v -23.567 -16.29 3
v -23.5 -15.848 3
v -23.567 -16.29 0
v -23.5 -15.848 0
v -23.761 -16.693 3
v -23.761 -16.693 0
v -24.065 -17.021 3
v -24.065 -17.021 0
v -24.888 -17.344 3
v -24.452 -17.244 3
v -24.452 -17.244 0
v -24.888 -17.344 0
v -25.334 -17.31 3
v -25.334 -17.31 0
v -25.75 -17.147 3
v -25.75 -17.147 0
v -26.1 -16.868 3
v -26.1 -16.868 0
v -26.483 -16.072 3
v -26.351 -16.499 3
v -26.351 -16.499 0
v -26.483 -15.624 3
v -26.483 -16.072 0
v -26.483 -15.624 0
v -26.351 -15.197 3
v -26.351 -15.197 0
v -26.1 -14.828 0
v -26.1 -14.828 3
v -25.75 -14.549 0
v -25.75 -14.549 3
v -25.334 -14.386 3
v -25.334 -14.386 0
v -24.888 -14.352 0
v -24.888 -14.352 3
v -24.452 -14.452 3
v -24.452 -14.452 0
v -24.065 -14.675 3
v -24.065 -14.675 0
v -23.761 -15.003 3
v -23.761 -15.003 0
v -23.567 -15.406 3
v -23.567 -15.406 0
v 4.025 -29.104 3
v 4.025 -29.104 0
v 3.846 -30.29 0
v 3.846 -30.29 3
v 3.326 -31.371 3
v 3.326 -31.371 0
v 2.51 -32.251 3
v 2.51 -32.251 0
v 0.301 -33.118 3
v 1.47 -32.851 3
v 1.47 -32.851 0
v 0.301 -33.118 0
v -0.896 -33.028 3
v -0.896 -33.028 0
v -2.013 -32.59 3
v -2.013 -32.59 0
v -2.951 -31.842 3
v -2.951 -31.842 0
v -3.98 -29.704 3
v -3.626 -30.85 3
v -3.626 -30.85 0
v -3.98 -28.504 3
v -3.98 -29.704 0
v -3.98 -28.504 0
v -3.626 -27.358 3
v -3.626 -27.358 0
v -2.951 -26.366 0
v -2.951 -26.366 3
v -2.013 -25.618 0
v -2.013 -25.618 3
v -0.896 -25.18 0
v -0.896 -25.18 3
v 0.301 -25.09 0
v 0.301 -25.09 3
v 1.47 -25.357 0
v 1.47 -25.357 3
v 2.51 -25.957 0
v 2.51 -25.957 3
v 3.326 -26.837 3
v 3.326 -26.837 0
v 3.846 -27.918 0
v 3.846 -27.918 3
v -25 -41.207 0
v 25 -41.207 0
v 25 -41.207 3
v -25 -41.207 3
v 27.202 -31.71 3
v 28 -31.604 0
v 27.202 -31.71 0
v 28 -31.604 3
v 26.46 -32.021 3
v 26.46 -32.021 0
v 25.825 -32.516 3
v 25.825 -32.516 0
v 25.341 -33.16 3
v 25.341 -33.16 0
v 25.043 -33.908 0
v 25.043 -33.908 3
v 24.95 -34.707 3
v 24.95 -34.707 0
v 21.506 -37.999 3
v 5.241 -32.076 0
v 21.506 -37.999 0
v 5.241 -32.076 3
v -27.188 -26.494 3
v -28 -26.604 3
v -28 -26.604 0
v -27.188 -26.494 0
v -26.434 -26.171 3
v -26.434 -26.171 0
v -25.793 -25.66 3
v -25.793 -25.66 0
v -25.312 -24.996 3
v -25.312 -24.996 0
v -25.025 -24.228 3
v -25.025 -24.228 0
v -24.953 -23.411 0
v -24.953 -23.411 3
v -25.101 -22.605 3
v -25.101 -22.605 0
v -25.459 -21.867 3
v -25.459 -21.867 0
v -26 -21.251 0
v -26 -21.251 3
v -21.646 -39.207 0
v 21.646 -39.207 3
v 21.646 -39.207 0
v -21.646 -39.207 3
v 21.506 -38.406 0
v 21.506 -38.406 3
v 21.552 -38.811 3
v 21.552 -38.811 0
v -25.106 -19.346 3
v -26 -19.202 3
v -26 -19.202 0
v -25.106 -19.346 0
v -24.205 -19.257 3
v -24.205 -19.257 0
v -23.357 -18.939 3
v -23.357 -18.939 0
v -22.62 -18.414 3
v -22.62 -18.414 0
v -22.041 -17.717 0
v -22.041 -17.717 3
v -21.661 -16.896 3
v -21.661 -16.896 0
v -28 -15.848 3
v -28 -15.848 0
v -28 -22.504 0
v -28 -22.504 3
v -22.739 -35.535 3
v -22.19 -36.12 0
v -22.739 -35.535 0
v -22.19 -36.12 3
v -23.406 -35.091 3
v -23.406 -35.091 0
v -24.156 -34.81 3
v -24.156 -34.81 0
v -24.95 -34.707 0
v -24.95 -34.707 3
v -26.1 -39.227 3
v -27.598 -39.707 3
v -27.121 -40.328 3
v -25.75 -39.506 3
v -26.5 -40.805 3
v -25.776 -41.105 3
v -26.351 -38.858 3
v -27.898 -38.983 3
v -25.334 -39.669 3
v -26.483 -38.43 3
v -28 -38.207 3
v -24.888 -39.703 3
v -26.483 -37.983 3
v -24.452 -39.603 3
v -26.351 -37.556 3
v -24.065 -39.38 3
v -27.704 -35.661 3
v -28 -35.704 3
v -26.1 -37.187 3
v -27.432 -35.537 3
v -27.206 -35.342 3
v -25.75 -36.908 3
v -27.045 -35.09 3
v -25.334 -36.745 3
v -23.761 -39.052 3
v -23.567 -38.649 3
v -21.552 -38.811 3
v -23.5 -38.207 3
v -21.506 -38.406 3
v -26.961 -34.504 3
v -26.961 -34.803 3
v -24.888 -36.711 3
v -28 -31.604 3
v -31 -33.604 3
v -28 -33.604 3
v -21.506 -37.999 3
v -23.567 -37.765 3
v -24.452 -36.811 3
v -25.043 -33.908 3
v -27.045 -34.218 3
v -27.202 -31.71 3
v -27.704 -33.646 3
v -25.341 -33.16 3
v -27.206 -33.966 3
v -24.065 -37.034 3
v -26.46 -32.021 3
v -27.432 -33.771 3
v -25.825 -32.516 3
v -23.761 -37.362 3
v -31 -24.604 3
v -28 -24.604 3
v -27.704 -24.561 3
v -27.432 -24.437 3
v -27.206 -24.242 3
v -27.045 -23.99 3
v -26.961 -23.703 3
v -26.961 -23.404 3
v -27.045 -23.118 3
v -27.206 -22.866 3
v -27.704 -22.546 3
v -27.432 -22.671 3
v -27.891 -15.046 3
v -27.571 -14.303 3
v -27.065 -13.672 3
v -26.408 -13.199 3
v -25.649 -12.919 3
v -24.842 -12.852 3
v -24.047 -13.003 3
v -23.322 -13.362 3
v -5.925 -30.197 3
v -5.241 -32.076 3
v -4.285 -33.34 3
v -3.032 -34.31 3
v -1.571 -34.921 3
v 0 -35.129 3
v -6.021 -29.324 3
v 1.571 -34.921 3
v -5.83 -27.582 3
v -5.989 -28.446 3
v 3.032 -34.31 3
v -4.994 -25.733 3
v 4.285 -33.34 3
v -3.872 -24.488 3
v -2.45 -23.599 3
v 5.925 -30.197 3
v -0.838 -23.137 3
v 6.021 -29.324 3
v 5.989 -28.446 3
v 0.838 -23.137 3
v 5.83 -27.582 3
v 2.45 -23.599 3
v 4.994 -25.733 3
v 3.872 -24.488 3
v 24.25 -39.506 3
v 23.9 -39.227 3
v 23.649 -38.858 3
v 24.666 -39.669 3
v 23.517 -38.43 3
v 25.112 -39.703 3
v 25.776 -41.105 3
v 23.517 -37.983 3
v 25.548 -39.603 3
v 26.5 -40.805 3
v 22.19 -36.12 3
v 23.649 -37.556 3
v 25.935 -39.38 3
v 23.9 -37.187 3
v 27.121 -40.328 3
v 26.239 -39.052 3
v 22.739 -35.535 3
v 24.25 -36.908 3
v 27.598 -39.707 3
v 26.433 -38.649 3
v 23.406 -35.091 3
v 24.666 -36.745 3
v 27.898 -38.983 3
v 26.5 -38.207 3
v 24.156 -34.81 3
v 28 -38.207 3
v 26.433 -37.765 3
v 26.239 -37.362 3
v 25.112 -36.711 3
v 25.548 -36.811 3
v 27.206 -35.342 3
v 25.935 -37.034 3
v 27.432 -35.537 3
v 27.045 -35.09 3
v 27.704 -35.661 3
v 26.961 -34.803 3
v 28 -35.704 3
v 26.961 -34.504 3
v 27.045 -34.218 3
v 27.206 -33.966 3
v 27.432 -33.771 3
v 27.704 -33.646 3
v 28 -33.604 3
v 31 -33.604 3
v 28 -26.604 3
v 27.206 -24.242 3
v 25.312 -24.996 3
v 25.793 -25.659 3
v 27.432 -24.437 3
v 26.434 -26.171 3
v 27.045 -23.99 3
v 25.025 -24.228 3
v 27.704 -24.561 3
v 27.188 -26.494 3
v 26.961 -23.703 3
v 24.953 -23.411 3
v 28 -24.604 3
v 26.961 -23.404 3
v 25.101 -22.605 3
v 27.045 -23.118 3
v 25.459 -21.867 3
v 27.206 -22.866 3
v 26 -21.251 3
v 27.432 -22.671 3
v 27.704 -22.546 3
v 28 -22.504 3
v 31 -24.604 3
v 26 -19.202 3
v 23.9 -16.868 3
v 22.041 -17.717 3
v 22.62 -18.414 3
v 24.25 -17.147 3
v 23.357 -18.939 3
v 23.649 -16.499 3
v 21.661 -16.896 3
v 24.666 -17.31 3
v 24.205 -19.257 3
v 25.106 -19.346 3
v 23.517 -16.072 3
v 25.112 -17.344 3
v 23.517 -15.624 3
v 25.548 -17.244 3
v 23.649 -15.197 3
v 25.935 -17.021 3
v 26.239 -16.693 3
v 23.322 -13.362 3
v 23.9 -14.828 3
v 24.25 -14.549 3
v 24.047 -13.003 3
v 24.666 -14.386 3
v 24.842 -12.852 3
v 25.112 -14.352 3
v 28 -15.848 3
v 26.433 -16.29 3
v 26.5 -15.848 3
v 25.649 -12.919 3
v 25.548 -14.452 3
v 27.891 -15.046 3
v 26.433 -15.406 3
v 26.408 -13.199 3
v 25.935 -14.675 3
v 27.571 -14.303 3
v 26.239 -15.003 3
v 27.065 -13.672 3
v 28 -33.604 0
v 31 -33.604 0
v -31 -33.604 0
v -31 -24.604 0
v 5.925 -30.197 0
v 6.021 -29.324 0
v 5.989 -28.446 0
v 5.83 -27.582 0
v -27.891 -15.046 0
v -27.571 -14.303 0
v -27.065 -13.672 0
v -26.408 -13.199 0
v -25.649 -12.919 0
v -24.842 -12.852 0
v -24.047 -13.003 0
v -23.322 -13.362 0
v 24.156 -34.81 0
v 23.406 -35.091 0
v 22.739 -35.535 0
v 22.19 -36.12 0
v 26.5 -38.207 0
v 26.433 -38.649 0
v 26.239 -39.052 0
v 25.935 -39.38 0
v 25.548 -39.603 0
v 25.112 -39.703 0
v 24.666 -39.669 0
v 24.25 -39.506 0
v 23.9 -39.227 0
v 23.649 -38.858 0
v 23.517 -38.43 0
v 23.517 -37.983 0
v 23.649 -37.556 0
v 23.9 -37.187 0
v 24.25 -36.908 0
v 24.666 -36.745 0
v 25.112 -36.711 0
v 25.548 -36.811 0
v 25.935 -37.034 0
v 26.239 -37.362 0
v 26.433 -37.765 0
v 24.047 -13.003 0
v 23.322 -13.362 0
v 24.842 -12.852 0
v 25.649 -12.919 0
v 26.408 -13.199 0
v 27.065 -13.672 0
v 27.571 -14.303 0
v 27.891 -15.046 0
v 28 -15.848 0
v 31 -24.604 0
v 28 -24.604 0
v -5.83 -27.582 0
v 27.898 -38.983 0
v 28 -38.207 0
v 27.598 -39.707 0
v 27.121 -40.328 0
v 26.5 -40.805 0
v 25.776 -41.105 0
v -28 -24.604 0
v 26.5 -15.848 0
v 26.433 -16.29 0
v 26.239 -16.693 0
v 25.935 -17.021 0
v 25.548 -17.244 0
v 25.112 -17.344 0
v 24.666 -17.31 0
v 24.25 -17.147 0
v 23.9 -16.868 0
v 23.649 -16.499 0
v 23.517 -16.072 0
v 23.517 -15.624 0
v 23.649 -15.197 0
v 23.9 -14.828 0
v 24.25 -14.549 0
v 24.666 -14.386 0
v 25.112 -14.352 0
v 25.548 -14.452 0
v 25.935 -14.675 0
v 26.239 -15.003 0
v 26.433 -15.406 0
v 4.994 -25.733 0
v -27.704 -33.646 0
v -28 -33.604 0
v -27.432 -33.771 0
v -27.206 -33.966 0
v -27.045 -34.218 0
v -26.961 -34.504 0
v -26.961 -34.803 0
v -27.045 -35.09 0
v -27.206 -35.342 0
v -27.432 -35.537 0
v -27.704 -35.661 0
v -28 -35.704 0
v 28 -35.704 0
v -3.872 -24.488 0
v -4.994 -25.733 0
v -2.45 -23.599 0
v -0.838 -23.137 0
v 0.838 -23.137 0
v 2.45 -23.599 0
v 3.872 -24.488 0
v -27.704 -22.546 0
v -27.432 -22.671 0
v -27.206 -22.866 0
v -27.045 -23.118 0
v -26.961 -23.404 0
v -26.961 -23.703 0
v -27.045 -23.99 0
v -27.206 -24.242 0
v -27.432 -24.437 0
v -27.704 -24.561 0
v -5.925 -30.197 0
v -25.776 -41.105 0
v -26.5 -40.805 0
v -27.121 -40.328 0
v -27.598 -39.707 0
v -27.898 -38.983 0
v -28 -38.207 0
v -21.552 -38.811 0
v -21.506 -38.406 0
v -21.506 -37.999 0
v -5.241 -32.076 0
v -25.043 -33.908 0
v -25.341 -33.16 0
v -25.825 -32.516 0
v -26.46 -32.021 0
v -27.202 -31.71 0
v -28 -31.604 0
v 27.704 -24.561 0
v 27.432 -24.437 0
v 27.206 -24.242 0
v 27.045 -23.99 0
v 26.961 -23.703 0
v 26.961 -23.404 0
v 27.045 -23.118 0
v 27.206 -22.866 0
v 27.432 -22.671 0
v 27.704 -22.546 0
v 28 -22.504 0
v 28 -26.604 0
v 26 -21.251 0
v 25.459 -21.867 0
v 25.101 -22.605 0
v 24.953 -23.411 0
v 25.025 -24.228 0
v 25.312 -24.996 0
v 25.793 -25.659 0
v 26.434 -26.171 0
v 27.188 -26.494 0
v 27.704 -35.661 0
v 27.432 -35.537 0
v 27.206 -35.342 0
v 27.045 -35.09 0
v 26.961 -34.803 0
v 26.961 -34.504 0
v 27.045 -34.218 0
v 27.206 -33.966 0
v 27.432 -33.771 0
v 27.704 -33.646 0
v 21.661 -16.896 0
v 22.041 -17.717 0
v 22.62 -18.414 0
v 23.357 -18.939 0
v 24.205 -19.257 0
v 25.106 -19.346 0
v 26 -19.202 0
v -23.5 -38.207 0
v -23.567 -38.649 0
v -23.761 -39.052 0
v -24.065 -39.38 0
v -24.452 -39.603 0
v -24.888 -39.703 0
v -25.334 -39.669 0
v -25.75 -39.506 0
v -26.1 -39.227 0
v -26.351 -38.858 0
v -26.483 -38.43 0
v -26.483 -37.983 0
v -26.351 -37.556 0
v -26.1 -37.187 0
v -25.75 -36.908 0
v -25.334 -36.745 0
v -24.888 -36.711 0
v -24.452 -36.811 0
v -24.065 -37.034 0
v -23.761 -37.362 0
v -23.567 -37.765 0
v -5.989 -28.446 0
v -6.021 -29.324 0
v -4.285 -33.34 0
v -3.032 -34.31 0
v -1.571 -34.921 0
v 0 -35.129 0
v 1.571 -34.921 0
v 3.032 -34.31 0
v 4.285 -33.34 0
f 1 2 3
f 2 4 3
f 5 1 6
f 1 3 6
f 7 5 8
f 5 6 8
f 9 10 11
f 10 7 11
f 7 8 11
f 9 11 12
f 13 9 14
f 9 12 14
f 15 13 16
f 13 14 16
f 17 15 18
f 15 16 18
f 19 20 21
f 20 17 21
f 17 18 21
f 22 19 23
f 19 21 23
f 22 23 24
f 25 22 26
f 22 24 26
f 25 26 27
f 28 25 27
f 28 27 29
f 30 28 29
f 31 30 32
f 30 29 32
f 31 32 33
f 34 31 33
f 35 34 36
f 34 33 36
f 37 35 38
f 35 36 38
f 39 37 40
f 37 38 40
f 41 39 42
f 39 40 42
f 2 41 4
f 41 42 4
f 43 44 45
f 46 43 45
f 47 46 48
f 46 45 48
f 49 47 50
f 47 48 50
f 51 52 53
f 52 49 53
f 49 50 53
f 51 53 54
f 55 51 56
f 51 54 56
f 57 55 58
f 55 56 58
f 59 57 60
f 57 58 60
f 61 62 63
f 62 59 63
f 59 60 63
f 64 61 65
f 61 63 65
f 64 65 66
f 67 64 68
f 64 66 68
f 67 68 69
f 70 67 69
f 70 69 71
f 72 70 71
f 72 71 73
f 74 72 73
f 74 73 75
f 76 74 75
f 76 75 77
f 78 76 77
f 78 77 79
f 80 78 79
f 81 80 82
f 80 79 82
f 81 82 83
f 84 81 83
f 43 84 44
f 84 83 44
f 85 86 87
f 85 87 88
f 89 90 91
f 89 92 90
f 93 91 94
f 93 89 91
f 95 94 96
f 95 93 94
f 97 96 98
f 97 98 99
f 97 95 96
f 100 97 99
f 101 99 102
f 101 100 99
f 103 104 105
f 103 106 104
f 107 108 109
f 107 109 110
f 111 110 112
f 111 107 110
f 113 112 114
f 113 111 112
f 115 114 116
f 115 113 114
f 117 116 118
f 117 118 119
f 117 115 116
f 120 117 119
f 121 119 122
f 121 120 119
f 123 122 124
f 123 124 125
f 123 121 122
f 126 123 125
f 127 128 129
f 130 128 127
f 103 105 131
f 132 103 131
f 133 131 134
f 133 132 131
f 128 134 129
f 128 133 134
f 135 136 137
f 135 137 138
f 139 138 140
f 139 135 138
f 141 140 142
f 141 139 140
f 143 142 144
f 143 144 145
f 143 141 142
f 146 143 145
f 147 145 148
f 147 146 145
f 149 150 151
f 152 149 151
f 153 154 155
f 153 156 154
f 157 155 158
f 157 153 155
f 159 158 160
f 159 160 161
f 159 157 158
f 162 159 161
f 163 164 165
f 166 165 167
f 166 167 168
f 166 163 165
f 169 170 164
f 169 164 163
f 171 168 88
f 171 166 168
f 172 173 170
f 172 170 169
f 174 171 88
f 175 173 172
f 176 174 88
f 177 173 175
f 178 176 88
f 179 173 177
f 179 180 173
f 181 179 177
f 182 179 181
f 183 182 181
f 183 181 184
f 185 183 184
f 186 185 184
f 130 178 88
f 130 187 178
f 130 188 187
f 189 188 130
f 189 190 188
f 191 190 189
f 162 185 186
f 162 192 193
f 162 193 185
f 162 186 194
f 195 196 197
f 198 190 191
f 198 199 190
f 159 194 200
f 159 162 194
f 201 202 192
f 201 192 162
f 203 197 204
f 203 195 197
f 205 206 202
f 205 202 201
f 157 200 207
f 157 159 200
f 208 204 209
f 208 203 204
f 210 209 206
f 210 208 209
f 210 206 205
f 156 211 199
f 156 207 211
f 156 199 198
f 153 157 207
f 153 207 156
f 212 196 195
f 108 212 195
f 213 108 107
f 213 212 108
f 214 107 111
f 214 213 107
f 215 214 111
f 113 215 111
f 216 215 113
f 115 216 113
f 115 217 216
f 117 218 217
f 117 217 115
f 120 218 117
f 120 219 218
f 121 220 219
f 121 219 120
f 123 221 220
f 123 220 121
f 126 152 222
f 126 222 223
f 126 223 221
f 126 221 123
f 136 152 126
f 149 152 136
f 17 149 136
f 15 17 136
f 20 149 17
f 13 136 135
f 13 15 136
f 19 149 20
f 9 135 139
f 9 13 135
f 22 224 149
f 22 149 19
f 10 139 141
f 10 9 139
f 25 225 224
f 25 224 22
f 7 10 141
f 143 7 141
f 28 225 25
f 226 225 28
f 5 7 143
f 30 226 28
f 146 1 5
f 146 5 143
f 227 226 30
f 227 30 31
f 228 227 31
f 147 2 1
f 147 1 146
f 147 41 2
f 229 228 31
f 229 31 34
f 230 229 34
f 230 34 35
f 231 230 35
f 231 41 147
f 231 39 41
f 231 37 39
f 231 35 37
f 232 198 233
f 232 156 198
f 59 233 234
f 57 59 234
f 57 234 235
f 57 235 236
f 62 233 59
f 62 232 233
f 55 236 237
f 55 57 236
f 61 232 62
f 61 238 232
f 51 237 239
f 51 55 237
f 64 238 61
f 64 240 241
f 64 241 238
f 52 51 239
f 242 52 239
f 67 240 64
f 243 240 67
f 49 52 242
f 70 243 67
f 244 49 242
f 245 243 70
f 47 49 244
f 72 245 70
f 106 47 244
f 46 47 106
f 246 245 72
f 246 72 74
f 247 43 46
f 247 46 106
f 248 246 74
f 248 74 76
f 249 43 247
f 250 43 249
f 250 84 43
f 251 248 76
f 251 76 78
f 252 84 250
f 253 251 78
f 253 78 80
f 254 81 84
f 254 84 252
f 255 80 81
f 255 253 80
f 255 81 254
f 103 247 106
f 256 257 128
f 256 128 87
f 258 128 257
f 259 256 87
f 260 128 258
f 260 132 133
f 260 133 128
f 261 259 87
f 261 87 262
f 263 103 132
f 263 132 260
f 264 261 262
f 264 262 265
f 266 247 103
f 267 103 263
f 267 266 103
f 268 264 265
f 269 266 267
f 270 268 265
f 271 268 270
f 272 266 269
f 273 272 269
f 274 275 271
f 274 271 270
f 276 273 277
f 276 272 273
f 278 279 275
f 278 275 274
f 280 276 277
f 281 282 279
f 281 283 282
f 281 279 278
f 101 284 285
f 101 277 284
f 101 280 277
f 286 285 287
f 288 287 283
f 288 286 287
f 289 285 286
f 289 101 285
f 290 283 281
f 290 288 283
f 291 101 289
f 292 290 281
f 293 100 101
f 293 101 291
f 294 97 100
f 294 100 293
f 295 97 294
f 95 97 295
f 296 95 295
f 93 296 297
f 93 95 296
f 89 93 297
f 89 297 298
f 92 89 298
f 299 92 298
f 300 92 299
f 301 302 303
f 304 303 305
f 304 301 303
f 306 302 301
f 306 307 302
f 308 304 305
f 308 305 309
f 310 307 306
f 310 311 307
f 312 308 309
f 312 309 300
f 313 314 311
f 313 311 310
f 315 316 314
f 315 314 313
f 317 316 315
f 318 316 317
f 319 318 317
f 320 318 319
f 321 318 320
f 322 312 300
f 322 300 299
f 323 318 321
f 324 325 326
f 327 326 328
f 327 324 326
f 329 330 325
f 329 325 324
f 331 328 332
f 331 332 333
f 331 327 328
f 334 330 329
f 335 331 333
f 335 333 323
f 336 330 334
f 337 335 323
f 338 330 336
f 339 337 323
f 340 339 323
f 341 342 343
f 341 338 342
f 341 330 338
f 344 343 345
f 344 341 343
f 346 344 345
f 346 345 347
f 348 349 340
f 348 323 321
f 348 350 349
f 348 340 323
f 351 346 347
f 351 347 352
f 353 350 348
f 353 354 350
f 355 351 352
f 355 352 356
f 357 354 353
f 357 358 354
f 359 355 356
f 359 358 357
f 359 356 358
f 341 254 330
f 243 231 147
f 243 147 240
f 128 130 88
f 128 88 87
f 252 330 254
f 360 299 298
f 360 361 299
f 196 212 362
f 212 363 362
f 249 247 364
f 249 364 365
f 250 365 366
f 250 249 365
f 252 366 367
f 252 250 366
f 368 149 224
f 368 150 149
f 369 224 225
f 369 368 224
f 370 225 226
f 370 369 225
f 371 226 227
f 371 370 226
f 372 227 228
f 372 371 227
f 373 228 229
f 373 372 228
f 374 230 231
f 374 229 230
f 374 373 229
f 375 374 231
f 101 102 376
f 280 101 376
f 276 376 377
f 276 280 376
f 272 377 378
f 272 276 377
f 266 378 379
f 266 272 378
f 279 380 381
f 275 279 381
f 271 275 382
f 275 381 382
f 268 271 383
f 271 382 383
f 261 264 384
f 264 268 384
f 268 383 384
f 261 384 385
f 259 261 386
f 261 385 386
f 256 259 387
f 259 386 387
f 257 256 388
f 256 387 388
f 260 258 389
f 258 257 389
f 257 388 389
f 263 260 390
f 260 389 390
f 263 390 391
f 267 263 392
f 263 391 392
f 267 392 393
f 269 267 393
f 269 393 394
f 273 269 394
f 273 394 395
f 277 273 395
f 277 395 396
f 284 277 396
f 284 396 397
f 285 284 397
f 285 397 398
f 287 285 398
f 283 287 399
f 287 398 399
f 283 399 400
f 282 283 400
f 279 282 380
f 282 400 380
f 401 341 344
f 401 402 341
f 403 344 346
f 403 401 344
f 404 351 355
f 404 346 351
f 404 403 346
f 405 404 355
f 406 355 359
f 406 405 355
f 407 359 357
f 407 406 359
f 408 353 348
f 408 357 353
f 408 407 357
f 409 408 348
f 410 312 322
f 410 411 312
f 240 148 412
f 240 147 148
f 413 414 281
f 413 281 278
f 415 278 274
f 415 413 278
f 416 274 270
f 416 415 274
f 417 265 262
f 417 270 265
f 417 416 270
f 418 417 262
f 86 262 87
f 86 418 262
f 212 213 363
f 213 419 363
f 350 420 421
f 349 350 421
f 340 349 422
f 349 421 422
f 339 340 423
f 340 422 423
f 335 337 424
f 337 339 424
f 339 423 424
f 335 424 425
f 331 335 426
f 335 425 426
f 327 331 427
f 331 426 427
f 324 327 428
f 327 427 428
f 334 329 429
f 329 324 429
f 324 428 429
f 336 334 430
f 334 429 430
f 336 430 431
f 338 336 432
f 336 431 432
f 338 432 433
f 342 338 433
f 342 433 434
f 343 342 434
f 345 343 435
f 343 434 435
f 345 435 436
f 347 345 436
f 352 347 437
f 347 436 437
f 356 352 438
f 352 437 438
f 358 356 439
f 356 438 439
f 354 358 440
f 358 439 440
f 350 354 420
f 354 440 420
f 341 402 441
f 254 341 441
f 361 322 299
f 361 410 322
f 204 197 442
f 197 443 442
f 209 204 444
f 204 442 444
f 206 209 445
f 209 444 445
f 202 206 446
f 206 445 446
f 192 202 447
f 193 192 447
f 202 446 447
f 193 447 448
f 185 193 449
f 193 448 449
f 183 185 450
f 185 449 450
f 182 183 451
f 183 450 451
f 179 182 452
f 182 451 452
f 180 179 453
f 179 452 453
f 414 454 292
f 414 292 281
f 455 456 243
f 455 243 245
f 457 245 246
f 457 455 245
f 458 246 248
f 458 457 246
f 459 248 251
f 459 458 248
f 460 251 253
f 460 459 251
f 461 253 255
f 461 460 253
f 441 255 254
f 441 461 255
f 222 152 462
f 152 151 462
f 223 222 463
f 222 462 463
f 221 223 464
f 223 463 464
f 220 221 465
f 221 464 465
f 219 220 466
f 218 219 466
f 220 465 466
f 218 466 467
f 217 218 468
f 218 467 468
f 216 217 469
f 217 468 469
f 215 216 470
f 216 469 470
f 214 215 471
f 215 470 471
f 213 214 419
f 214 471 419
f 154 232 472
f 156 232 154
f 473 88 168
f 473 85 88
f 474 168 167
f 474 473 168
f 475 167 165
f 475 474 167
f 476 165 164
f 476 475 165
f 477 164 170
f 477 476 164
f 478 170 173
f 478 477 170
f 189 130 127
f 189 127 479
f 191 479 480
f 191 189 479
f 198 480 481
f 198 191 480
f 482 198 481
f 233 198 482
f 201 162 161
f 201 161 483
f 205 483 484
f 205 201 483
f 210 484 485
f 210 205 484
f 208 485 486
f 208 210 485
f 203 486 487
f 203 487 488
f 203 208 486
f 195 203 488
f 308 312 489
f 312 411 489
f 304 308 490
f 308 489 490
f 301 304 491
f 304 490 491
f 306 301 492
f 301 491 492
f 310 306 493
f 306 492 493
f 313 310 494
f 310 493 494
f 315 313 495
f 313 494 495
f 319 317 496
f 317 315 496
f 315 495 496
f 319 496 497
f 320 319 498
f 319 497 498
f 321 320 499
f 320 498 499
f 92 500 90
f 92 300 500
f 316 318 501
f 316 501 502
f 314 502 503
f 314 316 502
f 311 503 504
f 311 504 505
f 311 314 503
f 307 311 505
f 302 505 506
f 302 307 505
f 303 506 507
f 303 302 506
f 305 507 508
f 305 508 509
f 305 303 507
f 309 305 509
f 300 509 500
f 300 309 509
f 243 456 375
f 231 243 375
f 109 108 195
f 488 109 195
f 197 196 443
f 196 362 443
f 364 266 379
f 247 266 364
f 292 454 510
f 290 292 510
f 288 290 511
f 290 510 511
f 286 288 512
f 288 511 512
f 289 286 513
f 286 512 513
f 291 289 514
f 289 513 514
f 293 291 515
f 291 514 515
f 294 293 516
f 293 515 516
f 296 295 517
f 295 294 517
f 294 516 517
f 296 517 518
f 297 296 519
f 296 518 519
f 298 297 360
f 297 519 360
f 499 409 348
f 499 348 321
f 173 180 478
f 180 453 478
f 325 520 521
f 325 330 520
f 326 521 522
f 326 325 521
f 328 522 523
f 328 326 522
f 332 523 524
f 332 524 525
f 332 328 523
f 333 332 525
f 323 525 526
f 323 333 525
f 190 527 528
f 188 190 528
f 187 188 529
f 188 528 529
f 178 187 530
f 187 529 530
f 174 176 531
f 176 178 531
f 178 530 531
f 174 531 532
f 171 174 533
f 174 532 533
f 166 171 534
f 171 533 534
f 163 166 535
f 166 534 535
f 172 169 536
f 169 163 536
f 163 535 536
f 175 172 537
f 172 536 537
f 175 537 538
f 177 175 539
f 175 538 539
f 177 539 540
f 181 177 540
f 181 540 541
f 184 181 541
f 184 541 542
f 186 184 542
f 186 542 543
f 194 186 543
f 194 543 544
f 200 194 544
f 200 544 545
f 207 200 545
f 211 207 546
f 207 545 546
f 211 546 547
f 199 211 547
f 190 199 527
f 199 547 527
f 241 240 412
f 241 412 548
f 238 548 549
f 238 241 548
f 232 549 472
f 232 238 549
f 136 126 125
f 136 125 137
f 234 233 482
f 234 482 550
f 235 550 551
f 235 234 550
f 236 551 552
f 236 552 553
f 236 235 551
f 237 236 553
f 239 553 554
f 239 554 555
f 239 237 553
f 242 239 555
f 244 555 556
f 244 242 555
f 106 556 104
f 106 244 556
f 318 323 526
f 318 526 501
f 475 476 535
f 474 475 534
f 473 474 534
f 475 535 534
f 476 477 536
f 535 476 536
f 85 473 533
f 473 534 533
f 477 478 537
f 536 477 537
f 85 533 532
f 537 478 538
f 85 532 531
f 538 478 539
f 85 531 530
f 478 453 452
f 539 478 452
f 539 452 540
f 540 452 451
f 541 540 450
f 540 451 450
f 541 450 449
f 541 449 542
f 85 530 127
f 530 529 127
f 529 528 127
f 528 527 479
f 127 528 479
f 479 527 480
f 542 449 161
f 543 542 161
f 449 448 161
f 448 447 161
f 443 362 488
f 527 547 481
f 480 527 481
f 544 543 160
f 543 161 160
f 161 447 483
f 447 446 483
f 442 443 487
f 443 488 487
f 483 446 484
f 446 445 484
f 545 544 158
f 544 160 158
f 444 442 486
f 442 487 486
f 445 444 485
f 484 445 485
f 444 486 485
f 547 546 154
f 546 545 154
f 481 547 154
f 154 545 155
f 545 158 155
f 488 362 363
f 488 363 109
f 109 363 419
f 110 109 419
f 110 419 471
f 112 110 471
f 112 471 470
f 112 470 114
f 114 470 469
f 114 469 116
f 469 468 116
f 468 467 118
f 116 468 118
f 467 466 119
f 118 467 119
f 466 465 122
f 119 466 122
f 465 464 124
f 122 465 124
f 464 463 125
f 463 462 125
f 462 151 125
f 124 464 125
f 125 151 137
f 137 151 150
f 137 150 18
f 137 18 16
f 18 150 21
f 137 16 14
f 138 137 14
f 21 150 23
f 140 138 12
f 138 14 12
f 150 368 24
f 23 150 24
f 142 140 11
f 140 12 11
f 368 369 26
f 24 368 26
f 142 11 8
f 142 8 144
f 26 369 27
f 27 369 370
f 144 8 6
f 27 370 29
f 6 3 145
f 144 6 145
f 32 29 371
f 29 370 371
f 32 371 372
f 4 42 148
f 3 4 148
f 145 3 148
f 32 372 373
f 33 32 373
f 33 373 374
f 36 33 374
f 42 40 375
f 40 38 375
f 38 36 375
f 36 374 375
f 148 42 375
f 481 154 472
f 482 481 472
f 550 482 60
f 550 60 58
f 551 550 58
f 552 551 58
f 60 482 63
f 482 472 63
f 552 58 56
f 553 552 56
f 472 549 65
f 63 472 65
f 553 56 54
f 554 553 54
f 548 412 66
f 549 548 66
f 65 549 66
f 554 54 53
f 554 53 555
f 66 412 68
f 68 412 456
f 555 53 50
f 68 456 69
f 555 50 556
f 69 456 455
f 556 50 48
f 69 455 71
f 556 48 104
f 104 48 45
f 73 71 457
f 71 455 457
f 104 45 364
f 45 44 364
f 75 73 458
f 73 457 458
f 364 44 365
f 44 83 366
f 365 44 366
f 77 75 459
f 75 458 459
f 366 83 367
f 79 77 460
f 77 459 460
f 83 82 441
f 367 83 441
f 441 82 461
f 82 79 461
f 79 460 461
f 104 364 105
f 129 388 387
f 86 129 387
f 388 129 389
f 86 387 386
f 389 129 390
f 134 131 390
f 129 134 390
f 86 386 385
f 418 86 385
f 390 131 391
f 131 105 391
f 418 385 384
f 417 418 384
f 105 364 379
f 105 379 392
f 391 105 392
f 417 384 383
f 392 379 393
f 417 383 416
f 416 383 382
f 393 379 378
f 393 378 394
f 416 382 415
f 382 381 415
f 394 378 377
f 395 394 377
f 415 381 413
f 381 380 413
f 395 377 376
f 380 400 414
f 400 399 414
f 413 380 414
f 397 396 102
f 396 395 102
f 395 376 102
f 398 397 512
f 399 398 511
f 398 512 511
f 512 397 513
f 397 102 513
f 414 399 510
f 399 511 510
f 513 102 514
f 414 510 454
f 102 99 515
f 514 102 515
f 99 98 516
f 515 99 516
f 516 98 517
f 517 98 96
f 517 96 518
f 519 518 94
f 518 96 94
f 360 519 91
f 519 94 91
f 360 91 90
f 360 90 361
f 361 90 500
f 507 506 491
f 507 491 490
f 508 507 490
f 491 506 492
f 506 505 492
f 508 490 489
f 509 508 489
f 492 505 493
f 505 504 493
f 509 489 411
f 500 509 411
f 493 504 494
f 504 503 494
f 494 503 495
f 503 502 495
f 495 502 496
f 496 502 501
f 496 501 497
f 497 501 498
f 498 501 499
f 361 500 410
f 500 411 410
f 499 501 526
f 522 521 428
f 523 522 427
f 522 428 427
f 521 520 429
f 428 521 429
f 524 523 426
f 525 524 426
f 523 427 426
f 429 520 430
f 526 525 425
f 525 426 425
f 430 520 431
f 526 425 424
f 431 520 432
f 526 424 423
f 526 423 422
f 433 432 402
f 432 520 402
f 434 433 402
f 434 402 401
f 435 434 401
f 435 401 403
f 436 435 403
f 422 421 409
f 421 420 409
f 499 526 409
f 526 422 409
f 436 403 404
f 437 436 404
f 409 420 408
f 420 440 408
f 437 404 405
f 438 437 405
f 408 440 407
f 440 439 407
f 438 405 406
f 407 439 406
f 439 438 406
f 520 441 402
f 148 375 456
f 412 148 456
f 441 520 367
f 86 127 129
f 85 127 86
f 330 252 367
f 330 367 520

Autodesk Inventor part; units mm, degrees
ref_plane "YZ Plane" through (0, 0, 0) normal (1, 0, 0) x (0, 1, 0)
ref_plane "XZ Plane" through (0, 0, 0) normal (0, 1, 0) x (-1, 0, 0)
ref_plane "XY Plane" through (0, 0, 0) normal (0, 0, 1) x (1, 0, 0)
sketch "スケッチ1" plane through (0, 0, 0) normal (0, 0, 1) x (1, 0, 0)
  line L0 (0, 0) -> (0, 4) construction
  line L1 (0, 0) -> (8.6476, -12.2564)
  line L2 (8.6476, -12.2564) -> (-0.2755, 4.5179)
  circle A0 centre (3.0119, -1.6621) radius 4
  line L3 (-57.3278, -140) -> (69.8706, -140)
  line L4 (3.0119, -1.6621) -> (117.7837, 59.3906)
  circle A1 centre (0, 0) radius 23.1
  circle A2 centre (0, -29.1039) radius 6.0039
  line L5 (0, 0) -> (0, -29.1039) construction
  circle A3 centre (0, -29.1039) radius 16.55
  circle A4 centre (0, -7.5039) radius 5.05
  circle A5 centre (0, 4) radius 3
  circle A6 centre (0, -7.5039) radius 20.05
  circle A7 centre (-14, 10.2376) radius 2.55
  circle A8 centre (14, 10.2376) radius 2.55
  circle A9 centre (14, -25.2454) radius 2.55
  circle A10 centre (-14, -25.2454) radius 2.55
  circle A11 centre (-14, 10.2376) radius 14
  circle A12 centre (14, 10.2376) radius 14
  circle A13 centre (14, -25.2454) radius 14
  circle A14 centre (-14, -25.2454) radius 14
  line L6 (-14, 10.2376) -> (-14, -25.2454) construction
  line L7 (-14, -25.2454) -> (14, -25.2454) construction
  circle A15 centre (0, 0) radius 9
  line L8 (-0.2755, 4.5179) -> (3.4816, -2.5449) construction
  line L9 (-2.9462, 3.0973) -> (0.8109, -3.9656)
  line L10 (6.1522, -1.1243) -> (2.3951, 5.9386)
  arc A16 (2.3951, 5.9386) -> (-2.9462, 3.0973) centre (-0.2755, 4.5179) ccw
  arc A17 (0.8109, -3.9656) -> (6.1522, -1.1243) centre (3.4816, -2.5449) ccw
  line L11 (-5, 2.8868) -> (5, 2.8868) construction
  line L12 (5, 2.8868) -> (0, -5.7735) construction
  line L13 (0, -5.7735) -> (-5, 2.8868) construction
  circle A18 centre (-5, 2.8868) radius 1.5
  circle A19 centre (5, 2.8868) radius 1.5
  circle A20 centre (0, -5.7735) radius 1.5
  line L14 (-28, 22.5965) -> (-28, -43.3295)
  line L15 (28, 22.9271) -> (28, -43.0008)
  line L16 (-28, 26.1991) -> (28, 26.1991)
  circle A21 centre (0, 0) radius 25.1
  line L17 (-28, -18.848) -> (28, -18.848)
  circle A22 centre (0, -29.1039) radius 8.0039
  circle A23 centre (-25, 23.1991) radius 3
  circle A24 centre (25, 23.1991) radius 3
  circle A25 centre (25, -38.2069) radius 3
  circle A26 centre (-25, -38.2069) radius 3
  circle A27 centre (-25, -15.848) radius 3
  circle A28 centre (25, -15.848) radius 3
  circle A29 centre (-25, -15.848) radius 4.5
  circle A30 centre (25, -15.848) radius 4.5
  circle A31 centre (0, -7.5039) radius 4.5
  circle A32 centre (0, -29.1039) radius 17.55
  circle A33 centre (0, -7.5039) radius 6.05
  point P0 (1.603, 0.9865)
  dimension "d0" = 4
  dimension "d1" = 15
  dimension "d2" = 18.4133
  dimension "d3" = 19
  dimension "d4" = 8
  dimension "d5" = 12
  dimension "d6" = 140
  dimension "d7" = 130
  dimension "d8" = 46.2
  dimension "d9" = 29.1039
  dimension "d10" = 33.1
  dimension "d11" = 10.1
  dimension "d12" = 6
  dimension "d13" = 40.1
  dimension "d14" = 28
  dimension "d15" = 28
  dimension "d16" = 28
  dimension "d17" = 28
  dimension "d18" = 18
  dimension "d19" = 8
  dimension "d20" = 6.05
  dimension "d21" = 3
  dimension "d22" = 3
  dimension "d23" = 3
  dimension "d24" = 10
  dimension "d25" = 2
  dimension "d26" = 2
  dimension "d27" = 6
  dimension "d28" = 6
  dimension "d29" = 6
  dimension "d30" = 6
  dimension "d31" = 6
  dimension "d32" = 6
  dimension "d33" = 9
  dimension "d34" = 9
  dimension "d35" = 9
  dimension "d36" = 5.1
  dimension "d37" = 1
  dimension "d38" = 1
  dimension "d39" = 56
  dimension "d40" = 28
sketch "スケッチ2" plane through (0, 0, 0) normal (0, 0, 1) x (1, 0, 0)
  circle A0 centre (-25, -15.848) radius 3 projected
  circle A1 centre (-25, -38.2069) radius 3 projected
  circle A2 centre (25, -38.2069) radius 3 projected
  circle A3 centre (25, -15.848) radius 3 projected
  circle A4 centre (0, -29.1039) radius 6.0039 construction
  circle A5 centre (0, 0) radius 25.1 construction
  circle A6 centre (0, -29.1039) radius 4.025
  line L0 (25, -41.2069) -> (-25, -41.2069)
  circle A7 centre (-25, -15.848) radius 1.5
  circle A8 centre (25, -15.848) radius 1.5
  circle A9 centre (25, -38.2069) radius 1.5
  circle A10 centre (-25, -38.2069) radius 1.5
  circle A11 centre (0, -29.1039) radius 6.025
  line L1 (23.3216, -13.3615) -> (4.9938, -25.733)
  line L2 (-4.9938, -25.733) -> (-23.3216, -13.3615)
  line L3 (-28, -15.848) -> (-28, -38.2069)
  line L4 (28, -15.848) -> (28, -38.2069)
  line L5 (-28, -24.6039) -> (-31, -24.6039)
  line L6 (-31, -24.6039) -> (-31, -33.6039)
  line L7 (-31, -33.6039) -> (-28, -33.6039)
  line L8 (28, -24.6039) -> (31, -24.6039)
  line L9 (31, -24.6039) -> (31, -33.6039)
  line L10 (31, -33.6039) -> (28, -33.6039)
  circle A12 centre (-28, -34.6539) radius 1.05
  circle A13 centre (-28, -23.5539) radius 1.05
  circle A14 centre (28, -23.5539) radius 1.05
  circle A15 centre (28, -34.6539) radius 1.05
  point P0 (-28, -22.5039)
  point P1 (-28, -35.7039)
  point P2 (28, -35.7039)
  point P3 (28, -22.5039)
  dimension "d41" = 8.05
  dimension "d52" = 3
  dimension "d53" = 3
  dimension "d54" = 3
  dimension "d55" = 3
  dimension "d57" = 2
  dimension "d61" = 3
  dimension "d62" = 9
  dimension "d63" = 3
  dimension "d64" = 9
  dimension "d65" = 2.1
  dimension "d66" = 2.1
  dimension "d67" = 2.1
  dimension "d68" = 2.1
  dimension "d69" = 4.5
extrude "押し出し2" add sketch "スケッチ2" along normal blind 3 contours A0 | A0 L2 A11 L1 A3 L4 A14 A15 A2 L0 A1 L3 A12 A13 | A11 | L3 L7 L6 L5 | A3 | A1 | L8 L9 L10 L4 | A2
sketch "スケッチ3" plane through (0, 0, 3) normal (0, 0, 1) x (1, 0, 0)
  line L0 (-28, -15.848) -> (-28, -22.5039) projected
  arc A0 (-28, -24.6039) -> (-28, -22.5039) centre (-28, -23.5539) ccw projected
  line L1 (-28, -24.6039) -> (-31, -24.6039) projected
  line L2 (-31, -24.6039) -> (-31, -33.6039) projected
  line L3 (-31, -33.6039) -> (-28, -33.6039) projected
  arc A1 (-28, -35.7039) -> (-28, -33.6039) centre (-28, -34.6539) ccw projected
  line L4 (-28, -35.7039) -> (-28, -38.2069) projected
  arc A2 (-28, -38.2069) -> (-25, -41.2069) centre (-25, -38.2069) ccw projected
  line L5 (-25, -41.2069) -> (25, -41.2069) projected
  arc A3 (25, -41.2069) -> (28, -38.2069) centre (25, -38.2069) ccw projected
  line L6 (28, -38.2069) -> (28, -35.7039) projected
  arc A4 (28, -33.6039) -> (28, -35.7039) centre (28, -34.6539) ccw projected
  line L7 (28, -33.6039) -> (31, -33.6039) projected
  line L8 (31, -33.6039) -> (31, -24.6039) projected
  line L9 (31, -24.6039) -> (28, -24.6039) projected
  arc A5 (28, -22.5039) -> (28, -24.6039) centre (28, -23.5539) ccw projected
  line L10 (28, -22.5039) -> (28, -15.848) projected
  arc A6 (28, -15.848) -> (23.3216, -13.3615) centre (25, -15.848) ccw projected
  line L11 (23.3216, -13.3615) -> (4.9938, -25.733) projected
  arc A7 (4.9938, -25.733) -> (-4.9938, -25.733) centre (0, -29.1039) ccw projected
  line L12 (-4.9938, -25.733) -> (-23.3216, -13.3615) projected
  arc A8 (-23.3216, -13.3615) -> (-28, -15.848) centre (-25, -15.848) ccw projected
  circle A9 centre (25, -38.2069) radius 1.5 projected
  circle A10 centre (-25, -38.2069) radius 1.5 projected
  circle A11 centre (25, -15.848) radius 1.5 projected
  circle A12 centre (0, -29.1039) radius 4.025 projected
  circle A13 centre (-25, -15.848) radius 1.5 projected
  line L13 (-24.4405, -15.0192) -> (-4.0141, -28.8074)
  arc A14 (4.0141, -28.8074) -> (-4.0141, -28.8074) centre (0, -29.1039) ccw
  line L14 (4.0141, -28.8074) -> (24.4405, -15.0192)
  arc A15 (26, -15.848) -> (24.4405, -15.0192) centre (25, -15.848) ccw
  line L15 (26, -15.848) -> (26, -21.2512)
  arc A16 (26, -21.2512) -> (28, -26.6039) centre (28, -23.5539) ccw
  line L16 (28, -26.6039) -> (29, -26.6039)
  line L17 (29, -26.6039) -> (29, -31.6039)
  line L18 (29, -31.6039) -> (28, -31.6039)
  arc A17 (28, -31.6039) -> (26, -36.9566) centre (28, -34.6539) ccw
  line L19 (26, -36.9566) -> (26, -38.2069)
  arc A18 (25, -39.2069) -> (26, -38.2069) centre (25, -38.2069) ccw
  line L20 (25, -39.2069) -> (-25, -39.2069)
  arc A19 (-26, -38.2069) -> (-25, -39.2069) centre (-25, -38.2069) ccw
  line L21 (-26, -38.2069) -> (-26, -36.9566)
  arc A20 (-26, -36.9566) -> (-28, -31.6039) centre (-28, -34.6539) ccw
  line L22 (-28, -31.6039) -> (-29, -31.6039)
  line L23 (-29, -31.6039) -> (-29, -26.6039)
  line L24 (-29, -26.6039) -> (-28, -26.6039)
  arc A21 (-28, -26.6039) -> (-26, -21.2512) centre (-28, -23.5539) ccw
  line L25 (-26, -21.2512) -> (-26, -15.848)
  arc A22 (-24.4405, -15.0192) -> (-26, -15.848) centre (-25, -15.848) ccw
  circle A23 centre (0, -29.1039) radius 6.025
  circle A24 centre (25, -15.848) radius 3.5
  circle A25 centre (25, -38.2069) radius 3.5
  circle A26 centre (-25, -38.2069) radius 3.5
  circle A27 centre (-25, -15.848) radius 3.5
  line L26 (-25, -38.2069) -> (0, -29.1039) construction
  line L27 (-24.6579, -39.1465) -> (0.3421, -30.0435)
  line L28 (-0.3421, -28.1643) -> (-25.3421, -37.2672)
  arc A28 (-25.3421, -37.2672) -> (-24.6579, -39.1465) centre (-25, -38.2069) ccw
  arc A29 (0.3421, -30.0435) -> (-0.3421, -28.1643) centre (0, -29.1039) ccw
  line L29 (0, -29.1039) -> (25, -38.2069) construction
  line L30 (-0.3421, -30.0435) -> (24.6579, -39.1465)
  line L31 (25.3421, -37.2672) -> (0.3421, -28.1643)
  arc A30 (0.3421, -28.1643) -> (-0.3421, -30.0435) centre (0, -29.1039) ccw
  arc A31 (24.6579, -39.1465) -> (25.3421, -37.2672) centre (25, -38.2069) ccw
  line L32 (-28, -22.5039) -> (-28, -35.7039)
  line L33 (28, -38.2069) -> (28, -35.7039) projected
  line L34 (28, -22.5039) -> (28, -35.7039)
  point P0 (0, 0)
  point P1 (-12.5, -33.6554)
  point P2 (12.5, -33.6554)
  point P3 (28, -26.6039)
  point P4 (26, -19.2021)
  point P5 (21.6605, -16.8957)
  point P6 (5.8296, -27.5818)
  point P7 (5.925, -30.1971)
  point P8 (22.1905, -36.1196)
  point P9 (24.9505, -34.7072)
  point P10 (21.5062, -37.9989)
  point P11 (5.2407, -32.0764)
  point P12 (-5.2407, -32.0764)
  point P13 (-21.5062, -37.9989)
  point P14 (-21.6459, -39.2069)
  point P15 (21.6459, -39.2069)
  point P16 (-28, -31.6039)
  point P17 (-24.9505, -34.7072)
  point P18 (-22.1905, -36.1196)
  point P19 (-5.925, -30.1971)
  point P20 (-5.8296, -27.5818)
  point P21 (-21.6605, -16.8957)
  point P22 (-26, -19.2021)
  dimension "d72" = 2
  dimension "d73" = 2
  dimension "d74" = 2
  dimension "d75" = 2
  dimension "d76" = 2
  dimension "d77" = 2
  dimension "d78" = 2
  dimension "d79" = 2
extrude "押し出し3" cut sketch "スケッチ3" against normal blind 10 contours A27 L13 A23 L28 A26 A20 L32 A21 L25 | L14 A24 L15 A16 L34 A17 A25 L31 A23 | A23 L30 A25 L20 A26 L27
equation "\"d14\" = d15"
equation "\"d16\" = d15"
equation "\"d17\" = d14"
equation "\"d40\" = 0.5 * d39"
properties part number "横回転フレーム改３" material "アルミニウム 2014-T4"
